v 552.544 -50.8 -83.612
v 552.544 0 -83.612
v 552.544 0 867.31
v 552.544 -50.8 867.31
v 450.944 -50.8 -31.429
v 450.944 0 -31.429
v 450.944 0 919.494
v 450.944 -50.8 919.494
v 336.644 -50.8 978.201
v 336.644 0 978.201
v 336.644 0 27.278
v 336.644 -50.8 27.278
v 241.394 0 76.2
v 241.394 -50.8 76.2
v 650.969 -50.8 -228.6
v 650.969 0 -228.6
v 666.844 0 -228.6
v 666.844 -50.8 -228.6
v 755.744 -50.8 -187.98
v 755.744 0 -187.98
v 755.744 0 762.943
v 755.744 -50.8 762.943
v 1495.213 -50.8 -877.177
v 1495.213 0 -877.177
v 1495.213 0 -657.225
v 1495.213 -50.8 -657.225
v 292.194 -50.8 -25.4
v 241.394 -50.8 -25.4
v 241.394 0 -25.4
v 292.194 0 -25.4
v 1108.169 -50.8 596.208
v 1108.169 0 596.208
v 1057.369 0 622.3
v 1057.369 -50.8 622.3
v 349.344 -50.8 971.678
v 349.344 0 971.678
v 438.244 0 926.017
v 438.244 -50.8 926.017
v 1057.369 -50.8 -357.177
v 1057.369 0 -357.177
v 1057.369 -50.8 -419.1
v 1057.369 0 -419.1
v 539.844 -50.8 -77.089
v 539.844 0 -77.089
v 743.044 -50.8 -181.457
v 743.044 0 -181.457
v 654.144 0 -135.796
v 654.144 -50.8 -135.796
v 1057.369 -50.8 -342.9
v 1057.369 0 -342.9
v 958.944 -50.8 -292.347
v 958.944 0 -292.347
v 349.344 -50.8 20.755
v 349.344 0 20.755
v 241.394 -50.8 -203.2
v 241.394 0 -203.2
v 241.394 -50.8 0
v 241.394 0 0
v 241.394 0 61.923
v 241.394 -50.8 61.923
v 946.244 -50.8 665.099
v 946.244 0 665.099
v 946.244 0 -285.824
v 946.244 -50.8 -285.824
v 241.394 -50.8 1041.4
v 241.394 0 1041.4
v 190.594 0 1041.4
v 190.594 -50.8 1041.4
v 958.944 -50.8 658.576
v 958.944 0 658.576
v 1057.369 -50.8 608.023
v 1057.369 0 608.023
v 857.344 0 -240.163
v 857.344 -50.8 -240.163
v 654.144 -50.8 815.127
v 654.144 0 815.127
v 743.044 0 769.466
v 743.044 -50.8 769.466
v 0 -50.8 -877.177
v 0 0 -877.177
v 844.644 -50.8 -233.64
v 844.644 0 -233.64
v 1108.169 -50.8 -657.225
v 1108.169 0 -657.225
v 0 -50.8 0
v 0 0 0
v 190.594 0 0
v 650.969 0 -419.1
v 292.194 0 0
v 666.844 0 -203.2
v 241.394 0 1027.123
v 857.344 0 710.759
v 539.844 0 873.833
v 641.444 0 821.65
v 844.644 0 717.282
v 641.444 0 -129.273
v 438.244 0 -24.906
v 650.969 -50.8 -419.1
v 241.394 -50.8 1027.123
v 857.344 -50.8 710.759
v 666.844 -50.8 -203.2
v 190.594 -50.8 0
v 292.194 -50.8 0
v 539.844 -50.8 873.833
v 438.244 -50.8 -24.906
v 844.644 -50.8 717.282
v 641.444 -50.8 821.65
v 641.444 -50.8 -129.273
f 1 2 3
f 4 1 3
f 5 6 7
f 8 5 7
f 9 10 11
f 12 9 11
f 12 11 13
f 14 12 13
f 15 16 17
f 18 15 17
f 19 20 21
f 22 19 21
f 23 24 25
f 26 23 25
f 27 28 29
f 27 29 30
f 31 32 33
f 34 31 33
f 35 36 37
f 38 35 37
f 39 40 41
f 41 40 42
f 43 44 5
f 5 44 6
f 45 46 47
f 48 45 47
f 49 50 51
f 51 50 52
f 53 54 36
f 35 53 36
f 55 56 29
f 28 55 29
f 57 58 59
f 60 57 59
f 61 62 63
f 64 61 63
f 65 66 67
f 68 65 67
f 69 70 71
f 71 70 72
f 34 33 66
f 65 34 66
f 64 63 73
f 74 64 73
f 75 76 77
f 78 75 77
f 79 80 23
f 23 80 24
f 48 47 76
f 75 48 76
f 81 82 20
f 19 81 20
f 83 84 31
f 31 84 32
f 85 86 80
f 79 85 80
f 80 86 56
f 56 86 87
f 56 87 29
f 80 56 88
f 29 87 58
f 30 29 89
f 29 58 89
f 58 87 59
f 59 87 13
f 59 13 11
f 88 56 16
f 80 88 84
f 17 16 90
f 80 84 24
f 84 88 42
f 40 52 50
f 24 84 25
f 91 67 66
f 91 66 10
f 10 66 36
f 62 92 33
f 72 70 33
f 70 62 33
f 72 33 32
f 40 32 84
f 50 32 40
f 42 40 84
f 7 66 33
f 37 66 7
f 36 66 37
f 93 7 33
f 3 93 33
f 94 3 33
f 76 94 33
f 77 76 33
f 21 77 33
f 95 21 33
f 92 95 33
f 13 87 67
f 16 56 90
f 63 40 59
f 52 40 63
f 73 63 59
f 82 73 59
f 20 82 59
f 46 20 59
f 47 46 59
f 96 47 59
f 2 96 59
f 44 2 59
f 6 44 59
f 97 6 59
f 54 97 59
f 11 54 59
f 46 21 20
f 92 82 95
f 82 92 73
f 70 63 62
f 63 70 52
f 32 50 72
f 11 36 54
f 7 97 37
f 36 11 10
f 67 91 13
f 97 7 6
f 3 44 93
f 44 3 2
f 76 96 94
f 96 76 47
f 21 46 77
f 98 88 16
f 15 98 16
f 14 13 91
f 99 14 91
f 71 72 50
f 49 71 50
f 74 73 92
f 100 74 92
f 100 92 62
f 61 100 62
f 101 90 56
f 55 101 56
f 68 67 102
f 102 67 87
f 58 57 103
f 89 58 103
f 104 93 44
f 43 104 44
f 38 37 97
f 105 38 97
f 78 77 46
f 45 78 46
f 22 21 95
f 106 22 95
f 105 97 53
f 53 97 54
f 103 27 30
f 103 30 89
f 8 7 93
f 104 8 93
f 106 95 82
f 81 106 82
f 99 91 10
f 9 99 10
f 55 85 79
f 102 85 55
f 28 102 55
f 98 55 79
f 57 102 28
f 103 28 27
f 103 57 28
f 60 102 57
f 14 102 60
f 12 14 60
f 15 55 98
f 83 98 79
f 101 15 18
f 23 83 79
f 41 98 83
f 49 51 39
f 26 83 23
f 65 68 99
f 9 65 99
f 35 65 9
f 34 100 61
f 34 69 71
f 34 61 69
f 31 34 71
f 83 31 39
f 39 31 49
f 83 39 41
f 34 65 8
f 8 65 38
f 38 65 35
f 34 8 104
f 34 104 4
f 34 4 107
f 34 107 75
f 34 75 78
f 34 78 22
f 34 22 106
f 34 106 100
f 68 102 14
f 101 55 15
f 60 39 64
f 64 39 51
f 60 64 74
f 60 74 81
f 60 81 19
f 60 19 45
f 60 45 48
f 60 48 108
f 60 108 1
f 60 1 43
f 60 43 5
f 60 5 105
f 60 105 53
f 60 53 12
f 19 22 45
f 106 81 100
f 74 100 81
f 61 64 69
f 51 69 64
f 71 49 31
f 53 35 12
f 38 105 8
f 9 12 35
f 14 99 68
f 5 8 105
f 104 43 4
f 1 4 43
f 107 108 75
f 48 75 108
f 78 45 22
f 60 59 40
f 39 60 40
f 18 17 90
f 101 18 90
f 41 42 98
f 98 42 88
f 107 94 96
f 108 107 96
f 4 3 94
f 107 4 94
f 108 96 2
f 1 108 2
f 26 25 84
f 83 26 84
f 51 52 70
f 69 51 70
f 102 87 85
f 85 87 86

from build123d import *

# Parameters (mm, degrees)
F0_W     = 15.875
F0_H     = 25.4
F0_W_2   = 50.8
F0_W_3   = 19.05
F1_DEPTH = 50.8


with BuildPart() as f1:
    # F0 (on Front) → F1 (new body)
    with BuildSketch(Plane.XZ):
        Polygon((336.64445, 978.200602), (336.64445, 27.277821), (349.34445, 20.754864), (349.34445, 971.677645), align=None)
        Polygon((438.24445, 926.016945), (438.24445, -24.905837), (450.94445, -31.428794), (450.94445, 919.493988), align=None)
        Polygon((539.84445, 873.833287), (539.84445, -77.089494), (552.54445, -83.612451), (552.54445, 867.31033), align=None)
        Polygon((641.44445, 821.64963), (641.44445, -129.273152), (654.14445, -135.796109), (654.14445, 815.126672), align=None)
        Polygon((743.04445, -181.456809), (755.74445, -187.979767), (755.74445, 762.943015), (743.04445, 769.465972), align=None)
        Polygon((844.64445, -233.640467), (857.34445, -240.163424), (857.34445, 710.759357), (844.64445, 717.282314), align=None)
        Polygon((946.24445, -285.824125), (958.94445, -292.347082), (958.94445, 658.5757), (946.24445, 665.098657), align=None)
        Polygon((1057.36945, -342.9), (1057.36945, -357.177219), (1057.36945, -419.1), (1076.41945, -419.1), (1076.41945, -444.5), (1057.36945, -444.5), (1057.36945, -657.225), (1108.16945, -657.225), (1108.16945, 596.208171), (1057.36945, 622.3), (1057.36945, 608.022781), align=None)
        Polygon((1057.36945, 622.3), (241.39445, 1041.4), (241.39445, 1027.122781), (336.64445, 978.200602), (349.34445, 971.677645), (438.24445, 926.016945), (450.94445, 919.493988), (539.84445, 873.833287), (552.54445, 867.31033), (641.44445, 821.64963), (654.14445, 815.126672), (743.04445, 769.465972), (755.74445, 762.943015), (844.64445, 717.282314), (857.34445, 710.759357), (946.24445, 665.098657), (958.94445, 658.5757), (1057.36945, 608.022781), align=None)
        Polygon((190.59445, 1041.4), (190.59445, 0), (241.39445, 0), (241.39445, 61.922781), (241.39445, 76.2), (241.39445, 1027.122781), (241.39445, 1041.4), align=None)
        Polygon((241.39445, 76.2), (241.39445, 61.922781), (1057.36945, -357.177219), (1057.36945, -342.9), (958.94445, -292.347082), (946.24445, -285.824125), (857.34445, -240.163424), (844.64445, -233.640467), (755.74445, -187.979767), (743.04445, -181.456809), (654.14445, -135.796109), (641.44445, -129.273152), (552.54445, -83.612451), (539.84445, -77.089494), (450.94445, -31.428794), (438.24445, -24.905837), (349.34445, 20.754864), (336.64445, 27.277821), align=None)
        Polygon((190.59445, 0), (0, 0), (0, -877.176762), (1495.213354, -877.176762), (1495.213354, -657.225), (1108.16945, -657.225), (1057.36945, -657.225), (1057.36945, -444.5), (1057.36945, -419.1), (650.96945, -419.1), (650.96945, -228.6), (650.96945, -203.2), (241.39445, -203.2), (241.39445, -25.4), (241.39445, 0), align=None)
        with Locations((658.90695, -215.9)):
            Rectangle(F0_W, F0_H)
        with Locations((266.79445, -12.7)):
            Rectangle(F0_W_2, F0_H)
        with Locations((1066.89445, -431.8)):
            Rectangle(F0_W_3, F0_H)
    extrude(amount=F1_DEPTH)


solid = f1.part
